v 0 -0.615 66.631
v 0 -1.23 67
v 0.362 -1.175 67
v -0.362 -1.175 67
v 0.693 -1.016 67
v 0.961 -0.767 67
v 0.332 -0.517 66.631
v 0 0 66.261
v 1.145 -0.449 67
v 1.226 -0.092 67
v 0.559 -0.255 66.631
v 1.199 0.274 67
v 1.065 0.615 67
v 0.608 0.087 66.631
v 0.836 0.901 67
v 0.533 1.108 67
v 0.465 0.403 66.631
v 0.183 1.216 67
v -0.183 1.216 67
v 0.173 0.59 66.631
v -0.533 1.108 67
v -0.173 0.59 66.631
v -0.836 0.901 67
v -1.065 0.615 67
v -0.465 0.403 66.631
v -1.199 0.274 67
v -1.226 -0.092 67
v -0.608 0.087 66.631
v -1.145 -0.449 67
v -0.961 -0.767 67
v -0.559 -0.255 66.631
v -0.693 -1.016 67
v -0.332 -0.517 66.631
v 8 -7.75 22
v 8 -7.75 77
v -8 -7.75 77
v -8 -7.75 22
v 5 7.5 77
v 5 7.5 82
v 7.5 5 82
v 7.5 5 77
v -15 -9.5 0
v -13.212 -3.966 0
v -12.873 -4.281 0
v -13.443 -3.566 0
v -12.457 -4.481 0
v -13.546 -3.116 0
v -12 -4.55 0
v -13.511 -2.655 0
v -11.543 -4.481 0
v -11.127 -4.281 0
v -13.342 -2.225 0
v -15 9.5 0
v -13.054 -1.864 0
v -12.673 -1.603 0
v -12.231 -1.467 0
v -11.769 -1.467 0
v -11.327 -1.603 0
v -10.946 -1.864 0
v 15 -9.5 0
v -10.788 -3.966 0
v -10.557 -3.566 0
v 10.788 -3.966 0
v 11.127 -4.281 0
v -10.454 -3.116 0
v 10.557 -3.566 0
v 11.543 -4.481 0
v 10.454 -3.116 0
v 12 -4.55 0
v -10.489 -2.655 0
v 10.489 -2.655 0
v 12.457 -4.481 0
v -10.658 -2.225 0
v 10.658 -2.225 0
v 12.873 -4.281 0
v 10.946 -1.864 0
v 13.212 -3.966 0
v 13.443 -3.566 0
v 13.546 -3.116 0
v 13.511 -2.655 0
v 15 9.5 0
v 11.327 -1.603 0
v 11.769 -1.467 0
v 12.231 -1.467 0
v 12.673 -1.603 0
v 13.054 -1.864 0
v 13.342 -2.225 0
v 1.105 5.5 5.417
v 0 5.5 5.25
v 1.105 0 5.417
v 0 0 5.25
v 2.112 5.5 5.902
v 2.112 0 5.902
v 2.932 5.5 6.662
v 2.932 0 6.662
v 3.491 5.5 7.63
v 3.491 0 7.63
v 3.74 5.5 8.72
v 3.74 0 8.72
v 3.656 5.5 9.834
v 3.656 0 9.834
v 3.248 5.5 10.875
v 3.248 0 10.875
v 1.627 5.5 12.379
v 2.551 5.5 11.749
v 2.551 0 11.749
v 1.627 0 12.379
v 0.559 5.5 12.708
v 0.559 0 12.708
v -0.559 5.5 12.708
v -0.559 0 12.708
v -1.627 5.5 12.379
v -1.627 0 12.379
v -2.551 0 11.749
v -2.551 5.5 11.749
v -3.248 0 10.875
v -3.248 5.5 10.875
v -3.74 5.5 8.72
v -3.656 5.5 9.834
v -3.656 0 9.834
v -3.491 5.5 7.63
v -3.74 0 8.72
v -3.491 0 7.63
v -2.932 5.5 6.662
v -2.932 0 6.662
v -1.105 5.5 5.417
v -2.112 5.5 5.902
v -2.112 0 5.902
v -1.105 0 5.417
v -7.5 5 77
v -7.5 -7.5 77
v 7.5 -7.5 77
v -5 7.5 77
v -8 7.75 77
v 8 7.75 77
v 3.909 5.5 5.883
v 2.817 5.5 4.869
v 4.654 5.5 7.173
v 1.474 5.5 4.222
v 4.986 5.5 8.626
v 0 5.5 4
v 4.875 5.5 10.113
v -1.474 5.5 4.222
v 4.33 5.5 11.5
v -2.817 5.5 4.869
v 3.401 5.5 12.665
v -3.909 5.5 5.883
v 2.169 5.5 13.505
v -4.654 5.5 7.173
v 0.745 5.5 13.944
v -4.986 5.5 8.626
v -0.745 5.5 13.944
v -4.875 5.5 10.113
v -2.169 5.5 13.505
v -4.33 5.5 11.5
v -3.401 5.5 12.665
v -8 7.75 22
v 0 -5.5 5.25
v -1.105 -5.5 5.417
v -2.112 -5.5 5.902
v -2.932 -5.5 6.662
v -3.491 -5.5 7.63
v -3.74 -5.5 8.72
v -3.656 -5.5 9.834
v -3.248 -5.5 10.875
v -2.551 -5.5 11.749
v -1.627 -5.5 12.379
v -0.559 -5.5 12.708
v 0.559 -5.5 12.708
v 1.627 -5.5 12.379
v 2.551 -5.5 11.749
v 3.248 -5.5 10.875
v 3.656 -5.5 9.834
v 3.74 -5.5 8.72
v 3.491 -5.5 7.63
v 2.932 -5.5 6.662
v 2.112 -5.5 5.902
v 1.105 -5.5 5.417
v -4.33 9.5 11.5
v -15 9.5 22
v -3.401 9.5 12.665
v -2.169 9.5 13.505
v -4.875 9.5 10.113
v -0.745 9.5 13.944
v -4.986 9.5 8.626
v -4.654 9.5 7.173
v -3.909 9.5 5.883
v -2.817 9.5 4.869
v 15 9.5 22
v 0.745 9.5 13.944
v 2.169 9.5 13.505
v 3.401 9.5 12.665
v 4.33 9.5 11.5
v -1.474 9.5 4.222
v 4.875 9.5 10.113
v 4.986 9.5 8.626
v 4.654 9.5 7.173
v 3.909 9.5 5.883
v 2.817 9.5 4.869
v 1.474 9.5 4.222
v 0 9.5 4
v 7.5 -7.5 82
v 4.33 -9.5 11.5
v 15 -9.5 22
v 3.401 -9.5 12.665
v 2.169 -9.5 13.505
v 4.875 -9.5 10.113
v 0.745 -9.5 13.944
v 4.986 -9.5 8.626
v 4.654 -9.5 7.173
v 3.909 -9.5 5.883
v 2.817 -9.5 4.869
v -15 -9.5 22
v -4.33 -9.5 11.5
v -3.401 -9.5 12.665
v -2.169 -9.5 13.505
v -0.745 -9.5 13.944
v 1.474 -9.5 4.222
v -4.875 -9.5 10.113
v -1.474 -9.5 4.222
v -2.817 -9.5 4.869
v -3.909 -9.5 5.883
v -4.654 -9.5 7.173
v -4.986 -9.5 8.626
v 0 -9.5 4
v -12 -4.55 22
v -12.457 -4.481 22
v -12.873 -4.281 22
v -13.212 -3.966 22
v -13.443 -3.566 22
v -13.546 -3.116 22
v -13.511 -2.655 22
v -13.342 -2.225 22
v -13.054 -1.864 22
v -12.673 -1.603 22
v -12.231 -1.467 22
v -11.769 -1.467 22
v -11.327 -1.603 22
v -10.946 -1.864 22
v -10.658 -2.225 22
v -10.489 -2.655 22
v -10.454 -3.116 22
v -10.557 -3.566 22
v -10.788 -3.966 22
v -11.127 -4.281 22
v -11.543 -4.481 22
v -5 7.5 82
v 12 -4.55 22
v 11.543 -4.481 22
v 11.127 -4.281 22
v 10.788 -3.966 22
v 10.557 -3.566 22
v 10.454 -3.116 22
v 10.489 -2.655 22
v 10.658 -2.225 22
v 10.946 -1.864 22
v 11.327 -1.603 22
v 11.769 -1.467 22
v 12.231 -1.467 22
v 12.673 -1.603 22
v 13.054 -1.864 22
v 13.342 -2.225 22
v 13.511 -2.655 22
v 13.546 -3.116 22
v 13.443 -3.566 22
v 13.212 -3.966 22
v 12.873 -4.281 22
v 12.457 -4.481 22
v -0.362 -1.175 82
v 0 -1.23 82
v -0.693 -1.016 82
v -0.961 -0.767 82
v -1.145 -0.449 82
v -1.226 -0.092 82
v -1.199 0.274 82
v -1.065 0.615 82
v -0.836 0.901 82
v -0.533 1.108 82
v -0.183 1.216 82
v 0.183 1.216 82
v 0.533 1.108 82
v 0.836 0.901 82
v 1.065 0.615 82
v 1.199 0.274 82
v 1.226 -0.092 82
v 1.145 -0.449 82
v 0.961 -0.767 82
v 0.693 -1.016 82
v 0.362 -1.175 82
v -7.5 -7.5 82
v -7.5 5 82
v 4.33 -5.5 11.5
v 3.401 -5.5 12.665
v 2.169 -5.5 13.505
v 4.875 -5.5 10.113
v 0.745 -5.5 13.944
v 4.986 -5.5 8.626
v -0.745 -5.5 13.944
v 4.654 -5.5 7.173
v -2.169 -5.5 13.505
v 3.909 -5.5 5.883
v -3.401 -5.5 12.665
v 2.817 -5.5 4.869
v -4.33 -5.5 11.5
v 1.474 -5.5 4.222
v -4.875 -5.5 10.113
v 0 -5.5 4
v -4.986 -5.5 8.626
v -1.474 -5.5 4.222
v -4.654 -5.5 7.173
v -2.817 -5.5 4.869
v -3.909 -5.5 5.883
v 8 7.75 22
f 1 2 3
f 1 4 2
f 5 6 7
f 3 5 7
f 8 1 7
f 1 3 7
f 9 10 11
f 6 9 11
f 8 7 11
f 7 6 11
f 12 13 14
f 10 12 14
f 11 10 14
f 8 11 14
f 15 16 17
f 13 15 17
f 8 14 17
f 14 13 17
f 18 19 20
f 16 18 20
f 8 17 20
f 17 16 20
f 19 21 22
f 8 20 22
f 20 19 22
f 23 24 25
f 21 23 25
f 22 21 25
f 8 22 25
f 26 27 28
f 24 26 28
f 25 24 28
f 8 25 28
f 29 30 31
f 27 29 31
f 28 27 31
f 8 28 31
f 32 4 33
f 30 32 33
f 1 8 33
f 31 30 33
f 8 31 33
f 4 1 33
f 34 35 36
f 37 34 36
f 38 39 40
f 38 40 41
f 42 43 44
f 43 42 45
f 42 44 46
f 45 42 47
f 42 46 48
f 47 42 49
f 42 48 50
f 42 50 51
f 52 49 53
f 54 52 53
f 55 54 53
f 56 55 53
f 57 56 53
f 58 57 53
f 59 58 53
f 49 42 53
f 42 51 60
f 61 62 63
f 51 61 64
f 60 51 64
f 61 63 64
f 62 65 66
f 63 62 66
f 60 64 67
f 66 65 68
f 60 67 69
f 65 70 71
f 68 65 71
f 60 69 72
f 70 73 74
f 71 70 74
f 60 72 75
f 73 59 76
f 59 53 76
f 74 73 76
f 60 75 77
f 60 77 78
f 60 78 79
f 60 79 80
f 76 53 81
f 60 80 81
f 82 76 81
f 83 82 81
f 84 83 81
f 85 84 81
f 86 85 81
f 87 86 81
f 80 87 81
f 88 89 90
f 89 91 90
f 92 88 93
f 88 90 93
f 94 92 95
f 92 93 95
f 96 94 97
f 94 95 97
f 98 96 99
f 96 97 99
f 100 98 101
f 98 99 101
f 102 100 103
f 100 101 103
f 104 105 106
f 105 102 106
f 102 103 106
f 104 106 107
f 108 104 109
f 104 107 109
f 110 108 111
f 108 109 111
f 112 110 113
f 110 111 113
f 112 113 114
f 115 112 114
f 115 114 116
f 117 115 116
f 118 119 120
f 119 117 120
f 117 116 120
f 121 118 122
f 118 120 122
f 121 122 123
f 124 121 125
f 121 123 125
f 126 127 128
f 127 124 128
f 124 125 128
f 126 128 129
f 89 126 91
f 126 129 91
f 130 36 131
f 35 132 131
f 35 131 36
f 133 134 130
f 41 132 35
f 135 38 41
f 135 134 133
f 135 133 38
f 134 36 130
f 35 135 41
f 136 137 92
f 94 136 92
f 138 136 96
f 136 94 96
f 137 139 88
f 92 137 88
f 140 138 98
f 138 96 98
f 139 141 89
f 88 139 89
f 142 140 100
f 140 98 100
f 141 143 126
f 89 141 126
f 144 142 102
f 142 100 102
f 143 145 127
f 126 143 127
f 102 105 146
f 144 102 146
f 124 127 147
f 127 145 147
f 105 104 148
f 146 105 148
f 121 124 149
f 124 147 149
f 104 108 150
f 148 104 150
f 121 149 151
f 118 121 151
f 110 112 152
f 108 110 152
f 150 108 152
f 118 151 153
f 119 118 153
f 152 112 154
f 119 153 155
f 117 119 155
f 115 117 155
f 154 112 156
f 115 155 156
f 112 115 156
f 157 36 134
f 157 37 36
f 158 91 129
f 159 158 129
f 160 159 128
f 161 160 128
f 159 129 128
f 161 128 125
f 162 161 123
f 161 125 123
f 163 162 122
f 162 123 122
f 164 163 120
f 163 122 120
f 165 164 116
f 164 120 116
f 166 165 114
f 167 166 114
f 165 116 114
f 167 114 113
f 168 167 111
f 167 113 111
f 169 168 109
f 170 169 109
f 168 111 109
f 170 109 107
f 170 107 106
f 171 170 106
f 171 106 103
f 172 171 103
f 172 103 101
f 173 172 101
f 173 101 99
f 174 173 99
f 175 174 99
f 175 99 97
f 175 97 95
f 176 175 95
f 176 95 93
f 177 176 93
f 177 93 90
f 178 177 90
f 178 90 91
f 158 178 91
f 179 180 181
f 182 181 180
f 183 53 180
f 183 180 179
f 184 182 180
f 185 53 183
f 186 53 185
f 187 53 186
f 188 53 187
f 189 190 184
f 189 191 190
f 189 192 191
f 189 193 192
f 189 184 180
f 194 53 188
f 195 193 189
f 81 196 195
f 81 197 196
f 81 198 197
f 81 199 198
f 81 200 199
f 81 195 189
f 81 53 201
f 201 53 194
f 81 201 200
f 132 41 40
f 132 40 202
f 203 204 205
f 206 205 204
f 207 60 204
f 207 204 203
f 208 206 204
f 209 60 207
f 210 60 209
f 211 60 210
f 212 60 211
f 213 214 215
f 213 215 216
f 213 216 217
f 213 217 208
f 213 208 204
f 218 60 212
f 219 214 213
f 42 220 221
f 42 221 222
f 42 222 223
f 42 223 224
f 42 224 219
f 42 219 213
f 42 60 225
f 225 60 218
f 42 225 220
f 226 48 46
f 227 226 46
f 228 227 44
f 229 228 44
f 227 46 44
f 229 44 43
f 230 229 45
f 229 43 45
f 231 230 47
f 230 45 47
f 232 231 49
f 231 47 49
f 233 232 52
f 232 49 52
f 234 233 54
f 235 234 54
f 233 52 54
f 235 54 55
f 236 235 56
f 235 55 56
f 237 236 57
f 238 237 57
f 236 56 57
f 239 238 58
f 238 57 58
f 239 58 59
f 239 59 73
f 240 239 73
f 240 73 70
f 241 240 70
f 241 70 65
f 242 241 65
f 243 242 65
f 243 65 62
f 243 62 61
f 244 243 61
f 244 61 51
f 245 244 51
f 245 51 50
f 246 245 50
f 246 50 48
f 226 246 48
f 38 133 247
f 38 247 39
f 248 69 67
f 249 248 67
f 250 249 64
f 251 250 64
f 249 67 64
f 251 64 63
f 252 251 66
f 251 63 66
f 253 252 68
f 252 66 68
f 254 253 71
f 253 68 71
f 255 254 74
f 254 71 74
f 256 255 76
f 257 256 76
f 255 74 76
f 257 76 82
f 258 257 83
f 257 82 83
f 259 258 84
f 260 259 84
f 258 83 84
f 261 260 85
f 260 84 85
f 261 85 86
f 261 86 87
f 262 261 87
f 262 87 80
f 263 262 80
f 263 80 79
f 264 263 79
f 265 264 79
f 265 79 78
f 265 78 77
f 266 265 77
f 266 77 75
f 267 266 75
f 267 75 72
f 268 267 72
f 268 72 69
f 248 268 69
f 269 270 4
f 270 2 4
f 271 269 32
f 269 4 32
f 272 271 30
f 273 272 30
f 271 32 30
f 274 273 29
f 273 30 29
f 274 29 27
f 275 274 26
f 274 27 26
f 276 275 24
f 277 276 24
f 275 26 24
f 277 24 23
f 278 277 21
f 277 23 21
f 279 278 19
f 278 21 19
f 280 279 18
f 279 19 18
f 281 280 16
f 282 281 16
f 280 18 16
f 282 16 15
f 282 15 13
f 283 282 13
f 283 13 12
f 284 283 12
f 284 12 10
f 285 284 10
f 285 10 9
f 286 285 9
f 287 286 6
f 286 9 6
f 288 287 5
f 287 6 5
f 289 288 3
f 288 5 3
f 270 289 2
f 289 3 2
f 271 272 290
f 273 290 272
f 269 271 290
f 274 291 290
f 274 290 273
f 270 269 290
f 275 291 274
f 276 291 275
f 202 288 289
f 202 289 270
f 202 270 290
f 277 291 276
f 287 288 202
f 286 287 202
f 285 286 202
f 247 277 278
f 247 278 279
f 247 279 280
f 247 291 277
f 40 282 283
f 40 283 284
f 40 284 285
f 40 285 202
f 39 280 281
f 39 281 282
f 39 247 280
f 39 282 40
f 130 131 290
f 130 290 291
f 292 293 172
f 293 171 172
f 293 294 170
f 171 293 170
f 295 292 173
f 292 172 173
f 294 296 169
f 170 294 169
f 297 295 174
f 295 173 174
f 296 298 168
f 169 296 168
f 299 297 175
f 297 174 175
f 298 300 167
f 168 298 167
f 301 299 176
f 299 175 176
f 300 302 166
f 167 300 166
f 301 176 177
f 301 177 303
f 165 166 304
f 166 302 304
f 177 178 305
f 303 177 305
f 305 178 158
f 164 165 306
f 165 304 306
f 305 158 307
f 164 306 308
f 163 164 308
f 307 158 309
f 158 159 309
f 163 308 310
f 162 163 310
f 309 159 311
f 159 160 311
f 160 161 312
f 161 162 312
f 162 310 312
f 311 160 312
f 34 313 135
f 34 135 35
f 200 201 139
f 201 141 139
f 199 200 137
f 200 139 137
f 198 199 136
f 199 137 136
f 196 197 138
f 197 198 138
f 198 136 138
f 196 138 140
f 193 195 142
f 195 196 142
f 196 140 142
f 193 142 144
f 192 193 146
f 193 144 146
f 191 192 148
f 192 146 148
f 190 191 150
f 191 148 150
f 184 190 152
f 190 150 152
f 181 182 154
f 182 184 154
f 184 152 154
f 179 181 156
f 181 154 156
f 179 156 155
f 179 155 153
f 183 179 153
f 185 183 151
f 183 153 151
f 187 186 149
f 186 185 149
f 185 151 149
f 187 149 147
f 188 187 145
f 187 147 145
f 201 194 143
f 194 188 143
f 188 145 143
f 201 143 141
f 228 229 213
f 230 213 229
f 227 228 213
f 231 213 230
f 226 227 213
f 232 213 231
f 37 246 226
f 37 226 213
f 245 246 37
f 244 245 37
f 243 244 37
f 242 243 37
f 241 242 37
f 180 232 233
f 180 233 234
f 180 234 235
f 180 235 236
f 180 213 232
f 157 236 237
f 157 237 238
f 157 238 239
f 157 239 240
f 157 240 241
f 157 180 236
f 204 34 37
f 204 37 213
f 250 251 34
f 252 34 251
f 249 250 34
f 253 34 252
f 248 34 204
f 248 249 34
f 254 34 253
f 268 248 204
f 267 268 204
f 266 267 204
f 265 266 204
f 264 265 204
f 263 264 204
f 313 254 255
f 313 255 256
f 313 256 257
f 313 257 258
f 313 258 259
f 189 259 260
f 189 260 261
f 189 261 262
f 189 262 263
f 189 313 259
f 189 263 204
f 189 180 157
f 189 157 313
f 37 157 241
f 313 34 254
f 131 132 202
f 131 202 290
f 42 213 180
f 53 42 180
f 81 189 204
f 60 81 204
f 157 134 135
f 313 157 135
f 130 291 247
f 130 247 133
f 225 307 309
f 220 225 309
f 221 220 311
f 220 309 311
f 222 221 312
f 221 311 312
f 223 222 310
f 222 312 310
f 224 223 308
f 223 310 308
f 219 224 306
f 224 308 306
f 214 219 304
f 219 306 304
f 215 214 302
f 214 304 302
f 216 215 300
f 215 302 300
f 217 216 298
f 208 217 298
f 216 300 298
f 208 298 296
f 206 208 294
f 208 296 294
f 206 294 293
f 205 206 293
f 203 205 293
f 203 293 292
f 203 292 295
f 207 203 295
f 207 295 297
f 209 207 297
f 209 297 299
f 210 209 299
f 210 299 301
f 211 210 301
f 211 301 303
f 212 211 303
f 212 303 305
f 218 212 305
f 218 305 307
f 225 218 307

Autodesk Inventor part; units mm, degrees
ref_plane "YZ Plane" through (0, 0, 0) normal (1, 0, 0) x (0, 1, 0)
ref_plane "XZ Plane" through (0, 0, 0) normal (0, 1, 0) x (-1, 0, 0)
ref_plane "XY Plane" through (0, 0, 0) normal (0, 0, 1) x (1, 0, 0)
sketch "Skizze1" plane through (0, 0, 0) normal (0, 0, 1) x (1, 0, 0)
  line L0 (15, -9.5) -> (-15, -9.5)
  line L1 (-15, -9.5) -> (-15, 9.5)
  line L2 (-15, 9.5) -> (15, 9.5)
  line L3 (15, 9.5) -> (15, -9.5)
  line L4 (15, -9.5) -> (-15, 9.5) construction
  line L5 (-15, -9.5) -> (15, 9.5) construction
  point P0 (0, 0)
  dimension "d0" = 30
  dimension "d1" = 19
extrude "Extrusion1" add sketch "Skizze1" along normal blind 22
sketch "Skizze7" plane through (0, 0, 22) normal (0, 0, 1) x (1, 0, 0)
  line L0 (-7.5, -7.5) -> (-7.5, 7.5)
  line L1 (-7.5, 7.5) -> (7.5, 7.5)
  line L2 (7.5, 7.5) -> (7.5, -7.5)
  line L3 (7.5, -7.5) -> (-7.5, -7.5)
  line L4 (15, -9.5) -> (15, 9.5) projected
  point P0 (0, 0)
  point P1 (0, -7.5)
  point P2 (7.5, 0)
  point P3 (15, 0)
  dimension "d36" = 15
  dimension "d37" = 15
extrude "Extrusion3" add sketch "Skizze7" along normal blind 60
chamfer "Fasen1" distance 2.5 angle 45 2 edges at (-7.5, 7.5, 52) (7.5, 7.5, 52)
sketch "Skizze2" plane through (-15, -9.5, 22) normal (0, 0, 1) x (1, 0, 0)
  line L0 (7, 17.25) -> (23, 17.25)
  line L1 (23, 17.25) -> (23, 1.75)
  line L2 (23, 1.75) -> (7, 1.75)
  line L3 (7, 1.75) -> (7, 17.25)
  line L4 (0, 0) -> (30, 0) projected
  point P0 (15, 9.5)
  point P1 (15, 1.75)
  point P2 (15, 0)
  point P3 (7, 9.5)
  dimension "d4" = 16
  dimension "d7" = 15.5
extrude "Extrusion2" add sketch "Skizze2" along normal blind 55
sketch "Skizze3" plane through (-15, -9.5, 82) normal (0, 0, 1) x (1, 0, 0)
  line L0 (23, 1.75) -> (23, 17.25) projected
  line L1 (23, 17.25) -> (7, 17.25) projected
  point P0 (15, 9.5)
  point P1 (15, 9.5)
  point P2 (23, 9.5)
  point P3 (15, 17.25)
hole "Bohrung1" at (0, 0, 82) direction (0, 0, -1) diameter 2.459 depth 15 tip angle 118 thread size "M3x0.5" class "6H" standard "ISO Metric profile"
sketch "Skizze4" plane through (-15, -9.5, 0) normal (0, -1, 0) x (1, 0, 0)
  line L0 (0, 0) -> (30, 0) projected
  line L1 (7, 77) -> (23, 77) projected
  line L2 (7.5, 82) -> (22.5, 82) projected
  point P0 (15, 0)
  point P1 (15, 9)
  point P2 (15, 0)
  dimension "d43" = 73
hole "Bohrung2" at (0, -9.5, 9) direction (0, 1, 0) diameter 7.5 depth 9.5 counterbore diameter 10 counterbore depth 4
mirror "Spiegeln1" about plane through (0, 0, 0) normal (0, 1, 0) of "Bohrung2"
sketch "Skizze5" plane through (0, 0, 22) normal (0, 0, 1) x (1, 0, 0)
  circle A0 centre (0, 0) radius 1.2295 projected
  line L0 (15, 9.5) -> (-15, 9.5) projected
  line L1 (-15, -9.5) -> (15, -9.5) projected
  point P0 (12, -3)
  point P1 (-12, -3)
  dimension "d30" = 24
  dimension "d31" = 12
  dimension "d34" = 6.5
  dimension "d35" = 6.5
hole "Bohrung3" at (12, -3, 22) at (-12, -3, 22) direction (0, 0, -1) diameter 3.1 depth 22
properties part number "Lagerbock" material "Stahl, galvanisiert"
